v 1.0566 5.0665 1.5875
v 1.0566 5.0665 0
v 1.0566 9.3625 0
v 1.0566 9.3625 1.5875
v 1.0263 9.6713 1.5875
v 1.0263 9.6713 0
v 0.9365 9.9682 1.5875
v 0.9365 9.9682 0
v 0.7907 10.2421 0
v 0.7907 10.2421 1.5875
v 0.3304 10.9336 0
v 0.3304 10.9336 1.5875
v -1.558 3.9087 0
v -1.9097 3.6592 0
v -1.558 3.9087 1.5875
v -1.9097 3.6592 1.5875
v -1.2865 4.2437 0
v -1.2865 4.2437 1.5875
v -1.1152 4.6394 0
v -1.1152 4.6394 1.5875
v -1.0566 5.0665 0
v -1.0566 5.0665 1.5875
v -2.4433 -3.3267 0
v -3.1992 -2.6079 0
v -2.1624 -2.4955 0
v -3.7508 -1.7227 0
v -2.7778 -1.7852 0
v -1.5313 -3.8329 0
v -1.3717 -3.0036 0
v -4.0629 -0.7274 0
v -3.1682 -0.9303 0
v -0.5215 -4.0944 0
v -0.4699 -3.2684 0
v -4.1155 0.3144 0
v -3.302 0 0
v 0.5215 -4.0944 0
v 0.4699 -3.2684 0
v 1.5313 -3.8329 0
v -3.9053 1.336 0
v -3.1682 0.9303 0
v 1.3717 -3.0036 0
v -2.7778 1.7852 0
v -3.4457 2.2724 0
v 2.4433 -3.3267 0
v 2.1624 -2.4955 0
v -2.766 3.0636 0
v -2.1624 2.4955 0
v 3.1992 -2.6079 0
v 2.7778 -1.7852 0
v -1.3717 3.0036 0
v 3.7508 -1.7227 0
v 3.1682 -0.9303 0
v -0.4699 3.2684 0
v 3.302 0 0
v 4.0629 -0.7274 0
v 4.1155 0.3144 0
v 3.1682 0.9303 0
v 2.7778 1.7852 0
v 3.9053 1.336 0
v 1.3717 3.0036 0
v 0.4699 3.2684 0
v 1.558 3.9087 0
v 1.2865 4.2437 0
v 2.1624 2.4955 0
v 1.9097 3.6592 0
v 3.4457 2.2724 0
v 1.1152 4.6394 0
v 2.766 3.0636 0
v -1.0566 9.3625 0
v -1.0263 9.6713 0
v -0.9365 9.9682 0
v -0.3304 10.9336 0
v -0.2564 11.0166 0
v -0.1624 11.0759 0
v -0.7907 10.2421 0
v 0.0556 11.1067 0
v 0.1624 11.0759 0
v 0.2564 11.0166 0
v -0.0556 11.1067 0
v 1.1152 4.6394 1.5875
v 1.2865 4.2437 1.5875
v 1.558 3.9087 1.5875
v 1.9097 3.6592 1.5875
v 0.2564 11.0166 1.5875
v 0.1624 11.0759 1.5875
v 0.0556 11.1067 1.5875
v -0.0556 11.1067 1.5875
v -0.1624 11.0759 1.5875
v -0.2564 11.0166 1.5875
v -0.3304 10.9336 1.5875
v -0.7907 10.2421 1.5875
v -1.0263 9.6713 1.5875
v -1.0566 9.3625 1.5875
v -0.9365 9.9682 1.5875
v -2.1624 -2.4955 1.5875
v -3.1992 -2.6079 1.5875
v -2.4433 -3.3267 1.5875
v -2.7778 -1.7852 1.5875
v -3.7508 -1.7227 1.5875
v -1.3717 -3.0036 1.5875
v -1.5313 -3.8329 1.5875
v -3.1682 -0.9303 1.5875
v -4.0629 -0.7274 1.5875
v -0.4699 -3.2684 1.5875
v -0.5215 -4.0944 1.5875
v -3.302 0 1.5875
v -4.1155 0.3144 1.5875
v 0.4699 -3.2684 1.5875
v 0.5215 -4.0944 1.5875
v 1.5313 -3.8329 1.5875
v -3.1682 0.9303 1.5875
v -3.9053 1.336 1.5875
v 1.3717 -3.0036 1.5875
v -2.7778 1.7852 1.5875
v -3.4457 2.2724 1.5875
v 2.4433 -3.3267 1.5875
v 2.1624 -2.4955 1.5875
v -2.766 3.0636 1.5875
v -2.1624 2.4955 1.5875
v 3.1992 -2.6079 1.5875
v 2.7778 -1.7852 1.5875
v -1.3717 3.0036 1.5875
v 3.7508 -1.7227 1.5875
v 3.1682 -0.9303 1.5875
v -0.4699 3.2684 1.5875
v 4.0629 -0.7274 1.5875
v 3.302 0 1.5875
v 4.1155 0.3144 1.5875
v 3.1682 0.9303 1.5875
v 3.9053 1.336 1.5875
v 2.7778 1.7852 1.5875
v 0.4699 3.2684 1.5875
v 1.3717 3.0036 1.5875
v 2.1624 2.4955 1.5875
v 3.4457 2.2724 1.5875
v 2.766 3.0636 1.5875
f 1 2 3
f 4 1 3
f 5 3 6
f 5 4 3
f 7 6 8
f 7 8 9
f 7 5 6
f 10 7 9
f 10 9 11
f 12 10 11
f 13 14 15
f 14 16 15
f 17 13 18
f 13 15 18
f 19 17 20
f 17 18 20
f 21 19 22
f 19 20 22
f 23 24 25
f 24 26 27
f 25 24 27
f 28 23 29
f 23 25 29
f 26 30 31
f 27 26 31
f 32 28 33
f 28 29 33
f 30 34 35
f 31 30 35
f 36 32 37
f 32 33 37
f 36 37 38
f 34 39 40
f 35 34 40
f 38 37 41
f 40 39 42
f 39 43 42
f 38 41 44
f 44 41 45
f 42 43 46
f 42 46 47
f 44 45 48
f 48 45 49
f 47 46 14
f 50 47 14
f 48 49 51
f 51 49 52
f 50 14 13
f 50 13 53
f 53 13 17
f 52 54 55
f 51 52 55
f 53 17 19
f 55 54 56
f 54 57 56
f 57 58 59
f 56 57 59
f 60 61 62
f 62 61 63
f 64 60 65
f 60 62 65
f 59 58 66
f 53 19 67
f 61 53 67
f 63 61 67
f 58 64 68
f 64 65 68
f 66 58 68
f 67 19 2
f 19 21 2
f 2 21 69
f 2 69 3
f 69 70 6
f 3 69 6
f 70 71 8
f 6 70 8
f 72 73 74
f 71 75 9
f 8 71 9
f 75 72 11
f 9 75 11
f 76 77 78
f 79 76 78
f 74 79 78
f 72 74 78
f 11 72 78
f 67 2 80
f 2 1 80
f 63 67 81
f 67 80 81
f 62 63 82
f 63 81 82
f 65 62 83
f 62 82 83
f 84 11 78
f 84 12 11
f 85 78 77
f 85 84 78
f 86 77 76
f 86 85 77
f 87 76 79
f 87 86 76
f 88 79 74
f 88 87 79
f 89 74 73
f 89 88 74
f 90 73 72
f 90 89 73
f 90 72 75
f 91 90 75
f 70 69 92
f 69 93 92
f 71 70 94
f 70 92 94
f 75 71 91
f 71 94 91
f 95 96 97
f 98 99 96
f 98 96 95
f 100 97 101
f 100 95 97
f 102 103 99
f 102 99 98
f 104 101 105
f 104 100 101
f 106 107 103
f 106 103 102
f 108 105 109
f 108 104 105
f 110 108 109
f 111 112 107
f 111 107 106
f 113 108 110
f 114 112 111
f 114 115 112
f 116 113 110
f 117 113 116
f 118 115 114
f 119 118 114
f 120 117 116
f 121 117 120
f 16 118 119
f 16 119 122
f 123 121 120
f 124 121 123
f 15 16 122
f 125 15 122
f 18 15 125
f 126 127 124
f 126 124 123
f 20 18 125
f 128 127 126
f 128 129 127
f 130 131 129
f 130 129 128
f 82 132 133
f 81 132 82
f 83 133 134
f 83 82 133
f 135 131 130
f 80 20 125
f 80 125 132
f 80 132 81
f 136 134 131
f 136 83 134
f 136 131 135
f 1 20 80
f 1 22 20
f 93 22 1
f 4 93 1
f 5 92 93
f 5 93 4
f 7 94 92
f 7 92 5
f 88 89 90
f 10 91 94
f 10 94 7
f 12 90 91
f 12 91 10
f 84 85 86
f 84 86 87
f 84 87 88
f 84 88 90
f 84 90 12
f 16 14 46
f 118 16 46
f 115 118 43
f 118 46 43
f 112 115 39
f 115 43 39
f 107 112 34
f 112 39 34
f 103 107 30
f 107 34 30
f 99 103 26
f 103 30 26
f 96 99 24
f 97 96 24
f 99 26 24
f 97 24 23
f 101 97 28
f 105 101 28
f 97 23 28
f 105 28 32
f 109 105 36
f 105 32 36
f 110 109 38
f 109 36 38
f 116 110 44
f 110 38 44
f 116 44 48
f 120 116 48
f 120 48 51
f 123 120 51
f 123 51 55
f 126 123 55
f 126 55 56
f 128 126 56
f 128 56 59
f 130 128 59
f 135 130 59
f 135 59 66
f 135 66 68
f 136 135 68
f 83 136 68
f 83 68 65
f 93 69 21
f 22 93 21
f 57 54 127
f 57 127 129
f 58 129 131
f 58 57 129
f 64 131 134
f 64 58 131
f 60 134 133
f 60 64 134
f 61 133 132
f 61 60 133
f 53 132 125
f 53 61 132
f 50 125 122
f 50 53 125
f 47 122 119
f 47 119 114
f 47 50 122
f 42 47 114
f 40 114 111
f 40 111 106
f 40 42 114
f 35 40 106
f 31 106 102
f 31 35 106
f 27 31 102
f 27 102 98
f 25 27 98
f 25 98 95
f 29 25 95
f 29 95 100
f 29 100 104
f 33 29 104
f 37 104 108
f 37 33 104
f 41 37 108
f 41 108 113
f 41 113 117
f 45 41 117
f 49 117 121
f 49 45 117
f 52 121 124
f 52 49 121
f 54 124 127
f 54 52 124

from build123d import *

# Parameters (mm, degrees)
SKETCH1_R           = 3.302
BOSS_EXTRUDE1_DEPTH = 1.5875
FILLET1_R           = 1.5875
FILLET2_R           = 0.396875
FILLET3_R           = 1.5875


with BuildPart() as part:
    # Sketch1 → Boss-Extrude1 (new body)
    with BuildSketch(Plane.XY):
        with BuildLine():
            Line((1.05664, 3.989958416), (1.05664, 9.8425))
            Line((1.05664, 9.8425), (0, 11.43))
            Line((0, 11.43), (-1.05664, 9.8425))
            Line((-1.05664, 9.8425), (-1.05664, 3.989958416))
            ThreePointArc((-1.05664, 3.989958416), (0, -4.1275), (1.05664, 3.989958416))
        make_face()
        Circle(SKETCH1_R, mode=Mode.SUBTRACT)
    extrude(amount=BOSS_EXTRUDE1_DEPTH)

    # Fillet1
    fillet1_edges = [part.edges().sort_by_distance(p)[0] for p in [
        (1.05664, 9.8425, 0.79375),
        (-1.05664, 9.8425, 0.79375),
    ]]
    fillet(fillet1_edges, radius=FILLET1_R)

    # Fillet2
    fillet2_edges = [part.edges().sort_by_distance(p)[0] for p in [
        (0, 11.43, 0.79375),
    ]]
    fillet(fillet2_edges, radius=FILLET2_R)

    # Fillet3
    fillet3_edges = [part.edges().sort_by_distance(p)[0] for p in [
        (1.05664, 3.989958416, 0.79375),
        (-1.05664, 3.989958416, 0.79375),
    ]]
    fillet(fillet3_edges, radius=FILLET3_R)


solid = part.part
